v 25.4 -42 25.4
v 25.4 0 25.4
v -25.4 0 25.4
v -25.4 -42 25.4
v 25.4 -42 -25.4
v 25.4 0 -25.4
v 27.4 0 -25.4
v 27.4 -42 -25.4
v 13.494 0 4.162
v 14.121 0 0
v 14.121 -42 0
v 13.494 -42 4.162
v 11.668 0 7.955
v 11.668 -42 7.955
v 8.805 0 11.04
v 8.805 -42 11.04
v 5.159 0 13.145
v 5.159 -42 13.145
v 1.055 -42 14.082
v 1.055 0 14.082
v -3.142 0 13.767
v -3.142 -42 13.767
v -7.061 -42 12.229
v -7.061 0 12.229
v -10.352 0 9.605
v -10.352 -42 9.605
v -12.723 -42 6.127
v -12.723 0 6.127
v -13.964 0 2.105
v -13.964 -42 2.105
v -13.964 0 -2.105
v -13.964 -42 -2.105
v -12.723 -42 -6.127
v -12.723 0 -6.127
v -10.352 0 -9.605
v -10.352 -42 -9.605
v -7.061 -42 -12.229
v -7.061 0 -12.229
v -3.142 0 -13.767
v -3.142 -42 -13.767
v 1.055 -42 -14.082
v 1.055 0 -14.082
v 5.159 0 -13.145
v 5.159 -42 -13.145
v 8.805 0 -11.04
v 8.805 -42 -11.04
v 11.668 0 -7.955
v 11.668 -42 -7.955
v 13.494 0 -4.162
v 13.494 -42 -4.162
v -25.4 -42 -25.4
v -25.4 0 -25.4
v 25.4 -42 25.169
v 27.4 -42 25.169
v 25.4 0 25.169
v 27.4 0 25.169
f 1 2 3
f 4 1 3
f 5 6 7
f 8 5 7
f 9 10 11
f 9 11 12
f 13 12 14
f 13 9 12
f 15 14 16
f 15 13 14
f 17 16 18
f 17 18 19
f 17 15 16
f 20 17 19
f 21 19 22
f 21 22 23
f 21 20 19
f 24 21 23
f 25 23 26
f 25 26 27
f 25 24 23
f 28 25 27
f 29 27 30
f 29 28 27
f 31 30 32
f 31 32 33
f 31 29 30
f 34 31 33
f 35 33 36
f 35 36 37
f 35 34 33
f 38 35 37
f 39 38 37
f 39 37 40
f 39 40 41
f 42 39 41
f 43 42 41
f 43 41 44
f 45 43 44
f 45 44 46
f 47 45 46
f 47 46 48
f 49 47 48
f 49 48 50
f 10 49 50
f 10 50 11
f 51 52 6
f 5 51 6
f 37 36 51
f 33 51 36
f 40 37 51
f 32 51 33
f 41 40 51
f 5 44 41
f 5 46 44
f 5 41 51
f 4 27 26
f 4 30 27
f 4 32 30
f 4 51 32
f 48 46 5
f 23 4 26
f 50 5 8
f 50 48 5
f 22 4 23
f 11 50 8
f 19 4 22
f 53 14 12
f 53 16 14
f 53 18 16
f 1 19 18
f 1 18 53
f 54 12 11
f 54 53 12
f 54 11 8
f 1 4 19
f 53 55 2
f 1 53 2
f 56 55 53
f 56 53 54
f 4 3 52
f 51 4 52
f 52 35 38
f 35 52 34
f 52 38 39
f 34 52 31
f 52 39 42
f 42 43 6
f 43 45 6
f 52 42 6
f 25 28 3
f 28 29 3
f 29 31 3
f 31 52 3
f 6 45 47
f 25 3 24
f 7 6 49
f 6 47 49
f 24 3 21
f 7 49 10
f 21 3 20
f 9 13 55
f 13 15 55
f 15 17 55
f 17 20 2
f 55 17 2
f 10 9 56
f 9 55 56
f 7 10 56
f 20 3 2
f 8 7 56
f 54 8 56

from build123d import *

# Parameters (mm, degrees)
F0_R     = 14.121323
F1_DEPTH = 7
F0_W     = 2
F0_H     = 50.568709
F2_DEPTH = 42


with BuildPart() as f1:
    # F0 (on Front) → F1 (new body)
    with BuildSketch(Plane.XZ):
        Polygon((25.4, 25.4), (-25.4, 25.4), (-25.4, -25.4), (25.4, -25.4), (25.4, 25.168709), align=None)
        Circle(F0_R, mode=Mode.SUBTRACT)
    extrude(amount=F1_DEPTH)

    # F0 (on Front) → F2 (join)
    with BuildSketch(Plane.XZ):
        Polygon((25.4, 25.4), (-25.4, 25.4), (-25.4, -25.4), (25.4, -25.4), (25.4, 25.168709), align=None)
        Circle(F0_R, mode=Mode.SUBTRACT)
        with Locations((26.4, -0.115645)):
            Rectangle(F0_W, F0_H)
    extrude(amount=F2_DEPTH)


solid = f1.part
